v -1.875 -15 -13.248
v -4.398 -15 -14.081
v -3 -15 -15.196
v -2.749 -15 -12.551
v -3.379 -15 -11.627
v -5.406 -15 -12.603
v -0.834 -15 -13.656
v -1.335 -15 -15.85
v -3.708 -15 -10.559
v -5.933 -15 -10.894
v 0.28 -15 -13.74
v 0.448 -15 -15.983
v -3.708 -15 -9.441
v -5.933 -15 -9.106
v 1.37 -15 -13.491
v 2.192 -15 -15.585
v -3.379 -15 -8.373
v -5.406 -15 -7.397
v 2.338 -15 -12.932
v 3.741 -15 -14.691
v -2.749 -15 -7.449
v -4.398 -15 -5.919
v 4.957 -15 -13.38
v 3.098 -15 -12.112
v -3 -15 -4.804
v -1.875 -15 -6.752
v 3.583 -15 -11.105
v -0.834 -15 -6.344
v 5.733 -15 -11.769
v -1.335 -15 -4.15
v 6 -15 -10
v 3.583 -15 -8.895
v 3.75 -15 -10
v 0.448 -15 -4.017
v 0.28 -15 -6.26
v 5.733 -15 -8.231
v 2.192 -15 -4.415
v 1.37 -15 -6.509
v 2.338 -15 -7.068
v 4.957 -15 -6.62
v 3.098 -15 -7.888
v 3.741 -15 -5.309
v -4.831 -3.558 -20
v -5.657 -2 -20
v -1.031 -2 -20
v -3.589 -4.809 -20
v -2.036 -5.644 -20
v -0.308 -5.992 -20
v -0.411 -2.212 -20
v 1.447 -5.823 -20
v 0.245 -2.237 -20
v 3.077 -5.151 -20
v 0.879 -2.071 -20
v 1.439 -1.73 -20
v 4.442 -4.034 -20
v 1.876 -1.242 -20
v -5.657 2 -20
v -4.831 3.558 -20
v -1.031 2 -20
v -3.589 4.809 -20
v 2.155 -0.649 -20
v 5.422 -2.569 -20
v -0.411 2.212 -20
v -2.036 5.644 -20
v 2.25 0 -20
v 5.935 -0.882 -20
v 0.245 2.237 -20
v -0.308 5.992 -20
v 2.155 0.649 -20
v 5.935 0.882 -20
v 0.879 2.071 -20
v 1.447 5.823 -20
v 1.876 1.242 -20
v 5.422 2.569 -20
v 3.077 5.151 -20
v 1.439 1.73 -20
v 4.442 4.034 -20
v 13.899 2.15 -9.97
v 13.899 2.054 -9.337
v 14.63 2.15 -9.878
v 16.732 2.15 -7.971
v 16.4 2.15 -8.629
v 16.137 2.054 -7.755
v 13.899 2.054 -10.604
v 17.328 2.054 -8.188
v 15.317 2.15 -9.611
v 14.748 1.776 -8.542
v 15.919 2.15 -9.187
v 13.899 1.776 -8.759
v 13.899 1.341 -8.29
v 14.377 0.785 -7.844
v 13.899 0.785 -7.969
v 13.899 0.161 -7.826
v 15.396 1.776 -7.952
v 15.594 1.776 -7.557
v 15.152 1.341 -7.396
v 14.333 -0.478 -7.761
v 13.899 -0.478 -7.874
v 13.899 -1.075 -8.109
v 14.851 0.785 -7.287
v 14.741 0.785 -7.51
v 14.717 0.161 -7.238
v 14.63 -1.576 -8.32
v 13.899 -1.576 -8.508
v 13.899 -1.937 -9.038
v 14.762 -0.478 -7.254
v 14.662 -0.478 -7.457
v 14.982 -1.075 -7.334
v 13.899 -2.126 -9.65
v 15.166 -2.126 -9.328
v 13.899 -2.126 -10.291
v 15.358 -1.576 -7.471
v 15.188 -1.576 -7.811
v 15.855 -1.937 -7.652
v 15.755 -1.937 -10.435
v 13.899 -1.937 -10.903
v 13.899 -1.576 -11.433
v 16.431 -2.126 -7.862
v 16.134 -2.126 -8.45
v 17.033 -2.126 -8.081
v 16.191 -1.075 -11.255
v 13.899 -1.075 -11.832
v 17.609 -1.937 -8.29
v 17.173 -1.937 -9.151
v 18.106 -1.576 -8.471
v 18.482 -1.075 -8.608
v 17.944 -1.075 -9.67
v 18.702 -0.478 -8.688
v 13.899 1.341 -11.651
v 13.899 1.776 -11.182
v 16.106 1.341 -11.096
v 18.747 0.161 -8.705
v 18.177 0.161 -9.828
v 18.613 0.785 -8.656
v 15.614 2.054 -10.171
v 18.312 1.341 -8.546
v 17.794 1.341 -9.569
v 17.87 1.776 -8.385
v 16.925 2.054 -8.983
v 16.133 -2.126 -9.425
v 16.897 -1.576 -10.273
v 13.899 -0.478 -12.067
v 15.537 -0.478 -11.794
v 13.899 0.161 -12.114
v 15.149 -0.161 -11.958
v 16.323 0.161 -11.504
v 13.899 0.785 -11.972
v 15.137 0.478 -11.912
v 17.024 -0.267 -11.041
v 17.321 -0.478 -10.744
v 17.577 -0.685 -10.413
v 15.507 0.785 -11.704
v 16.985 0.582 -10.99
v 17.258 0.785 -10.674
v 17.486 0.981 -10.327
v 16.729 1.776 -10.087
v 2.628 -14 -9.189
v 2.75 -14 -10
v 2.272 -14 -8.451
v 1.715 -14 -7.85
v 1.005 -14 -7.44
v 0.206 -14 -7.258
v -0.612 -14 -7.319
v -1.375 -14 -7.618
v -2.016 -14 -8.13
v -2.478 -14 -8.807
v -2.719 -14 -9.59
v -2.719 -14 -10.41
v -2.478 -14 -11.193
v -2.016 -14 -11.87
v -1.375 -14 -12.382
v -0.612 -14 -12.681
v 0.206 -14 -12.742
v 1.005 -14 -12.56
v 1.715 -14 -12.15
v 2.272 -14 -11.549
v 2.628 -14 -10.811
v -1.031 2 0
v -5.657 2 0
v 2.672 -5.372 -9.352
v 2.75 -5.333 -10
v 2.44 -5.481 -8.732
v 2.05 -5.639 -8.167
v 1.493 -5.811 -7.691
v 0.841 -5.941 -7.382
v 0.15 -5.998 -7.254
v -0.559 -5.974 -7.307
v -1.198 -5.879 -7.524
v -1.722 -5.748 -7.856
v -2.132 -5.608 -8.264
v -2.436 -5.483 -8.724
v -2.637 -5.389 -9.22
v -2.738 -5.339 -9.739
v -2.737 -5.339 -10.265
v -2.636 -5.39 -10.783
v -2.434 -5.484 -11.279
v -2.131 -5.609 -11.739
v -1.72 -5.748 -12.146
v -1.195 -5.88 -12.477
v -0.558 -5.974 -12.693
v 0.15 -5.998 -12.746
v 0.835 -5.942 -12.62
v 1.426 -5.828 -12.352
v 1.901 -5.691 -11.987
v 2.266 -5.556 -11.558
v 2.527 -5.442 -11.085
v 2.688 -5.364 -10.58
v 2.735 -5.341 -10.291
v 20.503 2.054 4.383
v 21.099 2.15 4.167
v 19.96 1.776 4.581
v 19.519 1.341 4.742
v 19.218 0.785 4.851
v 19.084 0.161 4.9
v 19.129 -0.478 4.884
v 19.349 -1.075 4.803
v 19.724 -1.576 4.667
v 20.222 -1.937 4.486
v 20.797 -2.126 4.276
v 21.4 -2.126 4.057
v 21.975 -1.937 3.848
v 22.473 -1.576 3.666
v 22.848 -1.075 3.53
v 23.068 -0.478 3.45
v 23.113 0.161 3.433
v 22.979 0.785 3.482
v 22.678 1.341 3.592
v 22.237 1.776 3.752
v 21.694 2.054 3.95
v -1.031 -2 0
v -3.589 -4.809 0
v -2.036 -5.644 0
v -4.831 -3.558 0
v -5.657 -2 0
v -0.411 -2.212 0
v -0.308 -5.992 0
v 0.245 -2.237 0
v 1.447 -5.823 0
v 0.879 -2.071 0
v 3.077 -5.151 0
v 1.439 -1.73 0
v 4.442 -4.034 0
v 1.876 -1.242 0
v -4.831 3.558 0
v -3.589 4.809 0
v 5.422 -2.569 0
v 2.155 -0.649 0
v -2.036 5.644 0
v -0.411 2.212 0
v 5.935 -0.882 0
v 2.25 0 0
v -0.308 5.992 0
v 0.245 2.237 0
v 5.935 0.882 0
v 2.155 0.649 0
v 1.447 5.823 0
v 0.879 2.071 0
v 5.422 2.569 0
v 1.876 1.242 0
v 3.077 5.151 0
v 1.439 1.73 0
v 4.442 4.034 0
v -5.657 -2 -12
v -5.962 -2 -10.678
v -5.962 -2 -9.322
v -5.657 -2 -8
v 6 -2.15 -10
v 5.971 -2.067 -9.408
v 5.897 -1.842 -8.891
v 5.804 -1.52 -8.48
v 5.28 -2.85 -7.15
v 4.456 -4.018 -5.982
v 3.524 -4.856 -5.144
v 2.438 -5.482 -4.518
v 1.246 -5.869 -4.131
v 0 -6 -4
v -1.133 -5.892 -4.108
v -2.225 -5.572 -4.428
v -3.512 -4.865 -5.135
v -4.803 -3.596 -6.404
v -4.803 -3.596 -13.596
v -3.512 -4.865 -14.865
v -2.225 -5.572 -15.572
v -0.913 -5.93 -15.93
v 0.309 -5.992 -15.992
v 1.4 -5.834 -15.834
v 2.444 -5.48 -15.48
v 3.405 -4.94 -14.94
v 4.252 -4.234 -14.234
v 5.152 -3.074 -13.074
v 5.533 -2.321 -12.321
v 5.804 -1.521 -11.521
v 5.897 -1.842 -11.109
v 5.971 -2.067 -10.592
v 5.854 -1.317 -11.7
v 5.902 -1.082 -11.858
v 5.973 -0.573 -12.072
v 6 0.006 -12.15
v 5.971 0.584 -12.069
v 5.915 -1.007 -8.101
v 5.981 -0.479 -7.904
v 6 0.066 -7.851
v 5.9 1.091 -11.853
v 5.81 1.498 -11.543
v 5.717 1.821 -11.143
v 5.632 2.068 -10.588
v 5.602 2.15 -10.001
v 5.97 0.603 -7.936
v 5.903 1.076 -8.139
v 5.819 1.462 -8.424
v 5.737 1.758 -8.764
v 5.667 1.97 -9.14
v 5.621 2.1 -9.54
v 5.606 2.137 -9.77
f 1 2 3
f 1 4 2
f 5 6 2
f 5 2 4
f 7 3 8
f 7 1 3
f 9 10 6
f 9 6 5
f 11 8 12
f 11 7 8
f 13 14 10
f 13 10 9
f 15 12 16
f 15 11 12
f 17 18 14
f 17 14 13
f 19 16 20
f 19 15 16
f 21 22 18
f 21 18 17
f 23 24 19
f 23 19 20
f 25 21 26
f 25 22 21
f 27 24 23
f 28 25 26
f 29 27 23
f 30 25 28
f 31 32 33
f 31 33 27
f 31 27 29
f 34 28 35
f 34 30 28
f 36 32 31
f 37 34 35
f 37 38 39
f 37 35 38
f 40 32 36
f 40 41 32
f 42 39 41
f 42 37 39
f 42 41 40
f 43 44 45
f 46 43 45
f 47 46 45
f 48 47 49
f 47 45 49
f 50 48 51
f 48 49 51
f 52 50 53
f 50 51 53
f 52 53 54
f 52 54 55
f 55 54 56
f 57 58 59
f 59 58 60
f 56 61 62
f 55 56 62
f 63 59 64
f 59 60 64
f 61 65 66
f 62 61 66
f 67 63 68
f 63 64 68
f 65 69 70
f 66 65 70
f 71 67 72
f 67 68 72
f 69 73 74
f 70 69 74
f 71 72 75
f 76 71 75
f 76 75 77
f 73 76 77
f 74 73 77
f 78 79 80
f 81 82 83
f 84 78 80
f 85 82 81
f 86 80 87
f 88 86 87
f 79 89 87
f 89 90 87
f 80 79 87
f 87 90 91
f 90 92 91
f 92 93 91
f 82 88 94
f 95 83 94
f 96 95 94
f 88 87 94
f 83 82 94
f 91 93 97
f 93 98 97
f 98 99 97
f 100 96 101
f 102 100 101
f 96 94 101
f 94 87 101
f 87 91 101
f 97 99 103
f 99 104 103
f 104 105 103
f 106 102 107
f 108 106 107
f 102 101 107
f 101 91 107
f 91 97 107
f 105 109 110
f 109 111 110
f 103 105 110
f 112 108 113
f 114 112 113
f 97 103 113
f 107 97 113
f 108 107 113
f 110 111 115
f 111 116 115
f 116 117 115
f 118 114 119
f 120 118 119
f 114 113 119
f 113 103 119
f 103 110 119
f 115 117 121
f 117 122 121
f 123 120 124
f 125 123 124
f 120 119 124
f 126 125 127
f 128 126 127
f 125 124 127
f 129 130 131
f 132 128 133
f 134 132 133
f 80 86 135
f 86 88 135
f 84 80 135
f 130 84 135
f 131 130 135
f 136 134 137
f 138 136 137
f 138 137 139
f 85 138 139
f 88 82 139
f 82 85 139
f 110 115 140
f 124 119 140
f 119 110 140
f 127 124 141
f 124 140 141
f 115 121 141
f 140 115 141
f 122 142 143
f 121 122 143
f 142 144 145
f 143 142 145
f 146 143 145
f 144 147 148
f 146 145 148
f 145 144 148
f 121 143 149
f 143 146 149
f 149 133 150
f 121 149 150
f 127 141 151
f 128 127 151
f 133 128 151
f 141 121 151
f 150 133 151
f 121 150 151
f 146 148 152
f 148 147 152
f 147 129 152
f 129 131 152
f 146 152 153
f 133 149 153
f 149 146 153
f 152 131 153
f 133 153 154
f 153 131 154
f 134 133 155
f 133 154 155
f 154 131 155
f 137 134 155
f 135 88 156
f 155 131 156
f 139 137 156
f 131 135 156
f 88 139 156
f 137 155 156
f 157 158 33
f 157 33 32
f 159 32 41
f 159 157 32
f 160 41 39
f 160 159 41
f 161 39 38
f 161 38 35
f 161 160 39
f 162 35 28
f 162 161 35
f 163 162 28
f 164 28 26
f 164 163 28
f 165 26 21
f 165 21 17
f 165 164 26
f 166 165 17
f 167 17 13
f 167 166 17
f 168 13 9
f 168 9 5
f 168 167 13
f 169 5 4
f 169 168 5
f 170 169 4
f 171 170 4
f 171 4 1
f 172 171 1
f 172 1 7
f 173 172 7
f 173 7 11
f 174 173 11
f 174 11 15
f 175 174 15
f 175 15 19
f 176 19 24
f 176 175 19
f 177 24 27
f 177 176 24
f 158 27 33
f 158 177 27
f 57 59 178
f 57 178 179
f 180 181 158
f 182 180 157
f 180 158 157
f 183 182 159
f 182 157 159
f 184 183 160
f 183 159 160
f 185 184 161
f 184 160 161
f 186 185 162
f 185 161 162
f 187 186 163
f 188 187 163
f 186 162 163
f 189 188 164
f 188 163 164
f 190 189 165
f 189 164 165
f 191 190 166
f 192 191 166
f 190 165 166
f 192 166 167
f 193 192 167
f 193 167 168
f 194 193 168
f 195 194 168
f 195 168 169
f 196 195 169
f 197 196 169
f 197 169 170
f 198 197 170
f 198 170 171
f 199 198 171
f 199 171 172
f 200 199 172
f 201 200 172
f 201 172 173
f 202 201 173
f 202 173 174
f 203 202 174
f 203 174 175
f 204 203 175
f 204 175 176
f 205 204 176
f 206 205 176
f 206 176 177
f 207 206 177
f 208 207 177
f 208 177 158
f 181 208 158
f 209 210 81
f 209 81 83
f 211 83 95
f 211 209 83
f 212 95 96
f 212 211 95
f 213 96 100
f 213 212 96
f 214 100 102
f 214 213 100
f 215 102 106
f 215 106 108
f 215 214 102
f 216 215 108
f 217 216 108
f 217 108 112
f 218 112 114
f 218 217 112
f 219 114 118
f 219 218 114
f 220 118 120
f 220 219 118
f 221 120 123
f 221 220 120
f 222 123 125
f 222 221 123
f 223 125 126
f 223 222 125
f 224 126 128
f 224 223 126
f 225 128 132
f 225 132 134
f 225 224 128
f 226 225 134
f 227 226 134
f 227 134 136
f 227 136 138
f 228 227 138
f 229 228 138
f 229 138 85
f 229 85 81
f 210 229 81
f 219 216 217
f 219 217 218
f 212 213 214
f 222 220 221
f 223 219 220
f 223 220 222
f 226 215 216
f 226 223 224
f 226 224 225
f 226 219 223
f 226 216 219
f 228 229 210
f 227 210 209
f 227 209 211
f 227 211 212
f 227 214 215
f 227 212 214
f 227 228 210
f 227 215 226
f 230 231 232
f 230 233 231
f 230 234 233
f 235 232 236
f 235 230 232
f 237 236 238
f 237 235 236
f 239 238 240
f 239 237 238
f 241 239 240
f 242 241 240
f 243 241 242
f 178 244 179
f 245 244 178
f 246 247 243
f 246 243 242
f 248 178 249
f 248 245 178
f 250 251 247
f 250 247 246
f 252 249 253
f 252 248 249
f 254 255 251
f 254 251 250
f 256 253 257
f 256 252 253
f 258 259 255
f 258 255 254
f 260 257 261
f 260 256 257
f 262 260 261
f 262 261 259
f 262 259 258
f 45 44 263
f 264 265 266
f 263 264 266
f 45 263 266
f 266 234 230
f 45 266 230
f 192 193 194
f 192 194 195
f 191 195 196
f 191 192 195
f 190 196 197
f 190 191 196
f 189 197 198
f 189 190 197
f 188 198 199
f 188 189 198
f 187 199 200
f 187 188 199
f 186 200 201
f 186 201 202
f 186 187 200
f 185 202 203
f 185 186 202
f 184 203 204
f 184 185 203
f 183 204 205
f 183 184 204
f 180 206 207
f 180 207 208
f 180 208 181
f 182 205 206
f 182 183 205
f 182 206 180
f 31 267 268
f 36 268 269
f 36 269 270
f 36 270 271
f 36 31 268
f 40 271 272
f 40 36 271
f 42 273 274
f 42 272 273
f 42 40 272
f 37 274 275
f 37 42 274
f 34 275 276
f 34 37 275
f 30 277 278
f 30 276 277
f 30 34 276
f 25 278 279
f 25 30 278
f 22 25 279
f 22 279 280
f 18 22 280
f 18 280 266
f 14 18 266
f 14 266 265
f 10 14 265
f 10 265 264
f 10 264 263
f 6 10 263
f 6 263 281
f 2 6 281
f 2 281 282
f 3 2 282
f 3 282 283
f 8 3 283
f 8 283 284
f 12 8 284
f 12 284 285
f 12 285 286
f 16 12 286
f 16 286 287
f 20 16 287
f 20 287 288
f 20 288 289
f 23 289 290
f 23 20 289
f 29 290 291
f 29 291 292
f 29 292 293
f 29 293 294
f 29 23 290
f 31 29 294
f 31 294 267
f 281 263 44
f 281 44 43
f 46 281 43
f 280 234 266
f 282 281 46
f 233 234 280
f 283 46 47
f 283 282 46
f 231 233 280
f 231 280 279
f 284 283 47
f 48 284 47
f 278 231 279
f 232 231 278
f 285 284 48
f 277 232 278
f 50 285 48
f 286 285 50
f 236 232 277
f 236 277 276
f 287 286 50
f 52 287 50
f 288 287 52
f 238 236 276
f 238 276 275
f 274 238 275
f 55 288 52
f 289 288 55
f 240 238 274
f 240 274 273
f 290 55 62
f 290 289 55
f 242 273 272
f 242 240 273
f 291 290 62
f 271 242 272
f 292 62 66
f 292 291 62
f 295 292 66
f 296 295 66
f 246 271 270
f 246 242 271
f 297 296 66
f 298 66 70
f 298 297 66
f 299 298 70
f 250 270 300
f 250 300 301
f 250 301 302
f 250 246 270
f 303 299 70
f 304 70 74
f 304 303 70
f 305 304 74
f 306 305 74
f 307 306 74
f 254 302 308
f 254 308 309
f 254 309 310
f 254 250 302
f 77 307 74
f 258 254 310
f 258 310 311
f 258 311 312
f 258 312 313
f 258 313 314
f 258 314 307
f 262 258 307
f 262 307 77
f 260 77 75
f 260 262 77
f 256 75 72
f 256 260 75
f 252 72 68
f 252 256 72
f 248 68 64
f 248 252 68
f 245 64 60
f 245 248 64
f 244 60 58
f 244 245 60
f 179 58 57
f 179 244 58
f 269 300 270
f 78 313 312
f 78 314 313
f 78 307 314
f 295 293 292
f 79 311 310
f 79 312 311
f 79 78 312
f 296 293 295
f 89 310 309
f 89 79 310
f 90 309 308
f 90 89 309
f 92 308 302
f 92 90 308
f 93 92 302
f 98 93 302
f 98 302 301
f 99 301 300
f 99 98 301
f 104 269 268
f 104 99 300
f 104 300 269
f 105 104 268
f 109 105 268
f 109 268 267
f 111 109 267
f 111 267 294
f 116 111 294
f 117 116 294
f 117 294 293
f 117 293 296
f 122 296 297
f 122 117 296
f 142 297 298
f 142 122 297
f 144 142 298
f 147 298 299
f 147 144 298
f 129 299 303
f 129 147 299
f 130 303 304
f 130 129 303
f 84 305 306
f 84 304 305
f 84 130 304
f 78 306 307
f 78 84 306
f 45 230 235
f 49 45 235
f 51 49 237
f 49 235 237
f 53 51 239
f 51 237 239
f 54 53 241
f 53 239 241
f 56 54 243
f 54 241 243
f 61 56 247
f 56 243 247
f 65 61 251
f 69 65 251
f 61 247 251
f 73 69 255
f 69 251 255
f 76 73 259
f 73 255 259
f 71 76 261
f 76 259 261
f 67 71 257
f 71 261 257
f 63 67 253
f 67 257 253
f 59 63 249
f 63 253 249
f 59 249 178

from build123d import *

# Parameters (mm, degrees)
F0_R      = 6
F1_DEPTH  = 20
F4_R      = 6
F4_R_2    = 2.75
F5_DEPTH  = 15
F7_DEPTH  = 20
F8_SIZE   = 1
F11_R     = 2.15
F2_R      = 2.25
F13_DEPTH = 20.0010001


# Not quite as in the source:
# - a feature of the source that left no trace in its solid (it failed there, or was rolled back) is left out


with BuildPart() as f1:
    # F0 (on Top) → F1 (new body)
    with BuildSketch(Plane.XY):
        Circle(F0_R)
    extrude(amount=-F1_DEPTH)

    # F4 (on offset) → F5 (join)
    with BuildSketch(Plane.XZ.offset(15)):
        with Locations((0, -10)):
            Circle(F4_R)
        with Locations((0, -10)):
            Circle(F4_R_2, mode=Mode.SUBTRACT)
    extrude(amount=-F5_DEPTH)

    # F6 (on face) → F7 (cut, through all)
    with BuildSketch(Plane.XY):
        with BuildLine():
            Line((0, 2), (-5.6568542495, 2))
            ThreePointArc((-5.6568542495, 2), (-6, 0), (-5.6568542495, -2))
            Line((-5.6568542495, -2), (0, -2))
            Line((0, -2), (0, 2))
        make_face()
        with BuildLine():
            Line((-5.6568542495, 2), (-8.5344118631, 2))
            Line((-8.5344118631, 2), (-8.5344118631, -2))
            Line((-8.5344118631, -2), (-5.6568542495, -2))
            ThreePointArc((-5.6568542495, -2), (-6, 0), (-5.6568542495, 2))
        make_face()
    extrude(amount=-F7_DEPTH, mode=Mode.SUBTRACT)

    # F8
    f8_edges = [f1.edges().sort_by_distance(p)[0] for p in [
        (-2.75, -15, -10),
    ]]
    chamfer(f8_edges, length=F8_SIZE)

    # F12: sweep along a path in F10
    with BuildLine(Plane.XZ) as f12_path:
        Line((0, -10), (13.8992802655, -9.9480403702))
        ThreePointArc((13.8992802655, -9.9480403702), (15.6179693755, -9.3990677428), (16.7109593102, -7.9635761178))
        Line((16.7109593102, -7.9635761178), (21.0774621296, 4.1742816034))
    # F11 (on offset) → F12 (sweep)
    with BuildSketch(Plane.YZ.offset(6)):
        with Locations((0, -10)):
            Circle(F11_R)
    sweep(path=f12_path.line)

    # F2 (on face) → F13 (cut, through all)
    with BuildSketch(Plane.XY):
        Circle(F2_R)
    extrude(amount=-F13_DEPTH, mode=Mode.SUBTRACT)


solid = f1.part
